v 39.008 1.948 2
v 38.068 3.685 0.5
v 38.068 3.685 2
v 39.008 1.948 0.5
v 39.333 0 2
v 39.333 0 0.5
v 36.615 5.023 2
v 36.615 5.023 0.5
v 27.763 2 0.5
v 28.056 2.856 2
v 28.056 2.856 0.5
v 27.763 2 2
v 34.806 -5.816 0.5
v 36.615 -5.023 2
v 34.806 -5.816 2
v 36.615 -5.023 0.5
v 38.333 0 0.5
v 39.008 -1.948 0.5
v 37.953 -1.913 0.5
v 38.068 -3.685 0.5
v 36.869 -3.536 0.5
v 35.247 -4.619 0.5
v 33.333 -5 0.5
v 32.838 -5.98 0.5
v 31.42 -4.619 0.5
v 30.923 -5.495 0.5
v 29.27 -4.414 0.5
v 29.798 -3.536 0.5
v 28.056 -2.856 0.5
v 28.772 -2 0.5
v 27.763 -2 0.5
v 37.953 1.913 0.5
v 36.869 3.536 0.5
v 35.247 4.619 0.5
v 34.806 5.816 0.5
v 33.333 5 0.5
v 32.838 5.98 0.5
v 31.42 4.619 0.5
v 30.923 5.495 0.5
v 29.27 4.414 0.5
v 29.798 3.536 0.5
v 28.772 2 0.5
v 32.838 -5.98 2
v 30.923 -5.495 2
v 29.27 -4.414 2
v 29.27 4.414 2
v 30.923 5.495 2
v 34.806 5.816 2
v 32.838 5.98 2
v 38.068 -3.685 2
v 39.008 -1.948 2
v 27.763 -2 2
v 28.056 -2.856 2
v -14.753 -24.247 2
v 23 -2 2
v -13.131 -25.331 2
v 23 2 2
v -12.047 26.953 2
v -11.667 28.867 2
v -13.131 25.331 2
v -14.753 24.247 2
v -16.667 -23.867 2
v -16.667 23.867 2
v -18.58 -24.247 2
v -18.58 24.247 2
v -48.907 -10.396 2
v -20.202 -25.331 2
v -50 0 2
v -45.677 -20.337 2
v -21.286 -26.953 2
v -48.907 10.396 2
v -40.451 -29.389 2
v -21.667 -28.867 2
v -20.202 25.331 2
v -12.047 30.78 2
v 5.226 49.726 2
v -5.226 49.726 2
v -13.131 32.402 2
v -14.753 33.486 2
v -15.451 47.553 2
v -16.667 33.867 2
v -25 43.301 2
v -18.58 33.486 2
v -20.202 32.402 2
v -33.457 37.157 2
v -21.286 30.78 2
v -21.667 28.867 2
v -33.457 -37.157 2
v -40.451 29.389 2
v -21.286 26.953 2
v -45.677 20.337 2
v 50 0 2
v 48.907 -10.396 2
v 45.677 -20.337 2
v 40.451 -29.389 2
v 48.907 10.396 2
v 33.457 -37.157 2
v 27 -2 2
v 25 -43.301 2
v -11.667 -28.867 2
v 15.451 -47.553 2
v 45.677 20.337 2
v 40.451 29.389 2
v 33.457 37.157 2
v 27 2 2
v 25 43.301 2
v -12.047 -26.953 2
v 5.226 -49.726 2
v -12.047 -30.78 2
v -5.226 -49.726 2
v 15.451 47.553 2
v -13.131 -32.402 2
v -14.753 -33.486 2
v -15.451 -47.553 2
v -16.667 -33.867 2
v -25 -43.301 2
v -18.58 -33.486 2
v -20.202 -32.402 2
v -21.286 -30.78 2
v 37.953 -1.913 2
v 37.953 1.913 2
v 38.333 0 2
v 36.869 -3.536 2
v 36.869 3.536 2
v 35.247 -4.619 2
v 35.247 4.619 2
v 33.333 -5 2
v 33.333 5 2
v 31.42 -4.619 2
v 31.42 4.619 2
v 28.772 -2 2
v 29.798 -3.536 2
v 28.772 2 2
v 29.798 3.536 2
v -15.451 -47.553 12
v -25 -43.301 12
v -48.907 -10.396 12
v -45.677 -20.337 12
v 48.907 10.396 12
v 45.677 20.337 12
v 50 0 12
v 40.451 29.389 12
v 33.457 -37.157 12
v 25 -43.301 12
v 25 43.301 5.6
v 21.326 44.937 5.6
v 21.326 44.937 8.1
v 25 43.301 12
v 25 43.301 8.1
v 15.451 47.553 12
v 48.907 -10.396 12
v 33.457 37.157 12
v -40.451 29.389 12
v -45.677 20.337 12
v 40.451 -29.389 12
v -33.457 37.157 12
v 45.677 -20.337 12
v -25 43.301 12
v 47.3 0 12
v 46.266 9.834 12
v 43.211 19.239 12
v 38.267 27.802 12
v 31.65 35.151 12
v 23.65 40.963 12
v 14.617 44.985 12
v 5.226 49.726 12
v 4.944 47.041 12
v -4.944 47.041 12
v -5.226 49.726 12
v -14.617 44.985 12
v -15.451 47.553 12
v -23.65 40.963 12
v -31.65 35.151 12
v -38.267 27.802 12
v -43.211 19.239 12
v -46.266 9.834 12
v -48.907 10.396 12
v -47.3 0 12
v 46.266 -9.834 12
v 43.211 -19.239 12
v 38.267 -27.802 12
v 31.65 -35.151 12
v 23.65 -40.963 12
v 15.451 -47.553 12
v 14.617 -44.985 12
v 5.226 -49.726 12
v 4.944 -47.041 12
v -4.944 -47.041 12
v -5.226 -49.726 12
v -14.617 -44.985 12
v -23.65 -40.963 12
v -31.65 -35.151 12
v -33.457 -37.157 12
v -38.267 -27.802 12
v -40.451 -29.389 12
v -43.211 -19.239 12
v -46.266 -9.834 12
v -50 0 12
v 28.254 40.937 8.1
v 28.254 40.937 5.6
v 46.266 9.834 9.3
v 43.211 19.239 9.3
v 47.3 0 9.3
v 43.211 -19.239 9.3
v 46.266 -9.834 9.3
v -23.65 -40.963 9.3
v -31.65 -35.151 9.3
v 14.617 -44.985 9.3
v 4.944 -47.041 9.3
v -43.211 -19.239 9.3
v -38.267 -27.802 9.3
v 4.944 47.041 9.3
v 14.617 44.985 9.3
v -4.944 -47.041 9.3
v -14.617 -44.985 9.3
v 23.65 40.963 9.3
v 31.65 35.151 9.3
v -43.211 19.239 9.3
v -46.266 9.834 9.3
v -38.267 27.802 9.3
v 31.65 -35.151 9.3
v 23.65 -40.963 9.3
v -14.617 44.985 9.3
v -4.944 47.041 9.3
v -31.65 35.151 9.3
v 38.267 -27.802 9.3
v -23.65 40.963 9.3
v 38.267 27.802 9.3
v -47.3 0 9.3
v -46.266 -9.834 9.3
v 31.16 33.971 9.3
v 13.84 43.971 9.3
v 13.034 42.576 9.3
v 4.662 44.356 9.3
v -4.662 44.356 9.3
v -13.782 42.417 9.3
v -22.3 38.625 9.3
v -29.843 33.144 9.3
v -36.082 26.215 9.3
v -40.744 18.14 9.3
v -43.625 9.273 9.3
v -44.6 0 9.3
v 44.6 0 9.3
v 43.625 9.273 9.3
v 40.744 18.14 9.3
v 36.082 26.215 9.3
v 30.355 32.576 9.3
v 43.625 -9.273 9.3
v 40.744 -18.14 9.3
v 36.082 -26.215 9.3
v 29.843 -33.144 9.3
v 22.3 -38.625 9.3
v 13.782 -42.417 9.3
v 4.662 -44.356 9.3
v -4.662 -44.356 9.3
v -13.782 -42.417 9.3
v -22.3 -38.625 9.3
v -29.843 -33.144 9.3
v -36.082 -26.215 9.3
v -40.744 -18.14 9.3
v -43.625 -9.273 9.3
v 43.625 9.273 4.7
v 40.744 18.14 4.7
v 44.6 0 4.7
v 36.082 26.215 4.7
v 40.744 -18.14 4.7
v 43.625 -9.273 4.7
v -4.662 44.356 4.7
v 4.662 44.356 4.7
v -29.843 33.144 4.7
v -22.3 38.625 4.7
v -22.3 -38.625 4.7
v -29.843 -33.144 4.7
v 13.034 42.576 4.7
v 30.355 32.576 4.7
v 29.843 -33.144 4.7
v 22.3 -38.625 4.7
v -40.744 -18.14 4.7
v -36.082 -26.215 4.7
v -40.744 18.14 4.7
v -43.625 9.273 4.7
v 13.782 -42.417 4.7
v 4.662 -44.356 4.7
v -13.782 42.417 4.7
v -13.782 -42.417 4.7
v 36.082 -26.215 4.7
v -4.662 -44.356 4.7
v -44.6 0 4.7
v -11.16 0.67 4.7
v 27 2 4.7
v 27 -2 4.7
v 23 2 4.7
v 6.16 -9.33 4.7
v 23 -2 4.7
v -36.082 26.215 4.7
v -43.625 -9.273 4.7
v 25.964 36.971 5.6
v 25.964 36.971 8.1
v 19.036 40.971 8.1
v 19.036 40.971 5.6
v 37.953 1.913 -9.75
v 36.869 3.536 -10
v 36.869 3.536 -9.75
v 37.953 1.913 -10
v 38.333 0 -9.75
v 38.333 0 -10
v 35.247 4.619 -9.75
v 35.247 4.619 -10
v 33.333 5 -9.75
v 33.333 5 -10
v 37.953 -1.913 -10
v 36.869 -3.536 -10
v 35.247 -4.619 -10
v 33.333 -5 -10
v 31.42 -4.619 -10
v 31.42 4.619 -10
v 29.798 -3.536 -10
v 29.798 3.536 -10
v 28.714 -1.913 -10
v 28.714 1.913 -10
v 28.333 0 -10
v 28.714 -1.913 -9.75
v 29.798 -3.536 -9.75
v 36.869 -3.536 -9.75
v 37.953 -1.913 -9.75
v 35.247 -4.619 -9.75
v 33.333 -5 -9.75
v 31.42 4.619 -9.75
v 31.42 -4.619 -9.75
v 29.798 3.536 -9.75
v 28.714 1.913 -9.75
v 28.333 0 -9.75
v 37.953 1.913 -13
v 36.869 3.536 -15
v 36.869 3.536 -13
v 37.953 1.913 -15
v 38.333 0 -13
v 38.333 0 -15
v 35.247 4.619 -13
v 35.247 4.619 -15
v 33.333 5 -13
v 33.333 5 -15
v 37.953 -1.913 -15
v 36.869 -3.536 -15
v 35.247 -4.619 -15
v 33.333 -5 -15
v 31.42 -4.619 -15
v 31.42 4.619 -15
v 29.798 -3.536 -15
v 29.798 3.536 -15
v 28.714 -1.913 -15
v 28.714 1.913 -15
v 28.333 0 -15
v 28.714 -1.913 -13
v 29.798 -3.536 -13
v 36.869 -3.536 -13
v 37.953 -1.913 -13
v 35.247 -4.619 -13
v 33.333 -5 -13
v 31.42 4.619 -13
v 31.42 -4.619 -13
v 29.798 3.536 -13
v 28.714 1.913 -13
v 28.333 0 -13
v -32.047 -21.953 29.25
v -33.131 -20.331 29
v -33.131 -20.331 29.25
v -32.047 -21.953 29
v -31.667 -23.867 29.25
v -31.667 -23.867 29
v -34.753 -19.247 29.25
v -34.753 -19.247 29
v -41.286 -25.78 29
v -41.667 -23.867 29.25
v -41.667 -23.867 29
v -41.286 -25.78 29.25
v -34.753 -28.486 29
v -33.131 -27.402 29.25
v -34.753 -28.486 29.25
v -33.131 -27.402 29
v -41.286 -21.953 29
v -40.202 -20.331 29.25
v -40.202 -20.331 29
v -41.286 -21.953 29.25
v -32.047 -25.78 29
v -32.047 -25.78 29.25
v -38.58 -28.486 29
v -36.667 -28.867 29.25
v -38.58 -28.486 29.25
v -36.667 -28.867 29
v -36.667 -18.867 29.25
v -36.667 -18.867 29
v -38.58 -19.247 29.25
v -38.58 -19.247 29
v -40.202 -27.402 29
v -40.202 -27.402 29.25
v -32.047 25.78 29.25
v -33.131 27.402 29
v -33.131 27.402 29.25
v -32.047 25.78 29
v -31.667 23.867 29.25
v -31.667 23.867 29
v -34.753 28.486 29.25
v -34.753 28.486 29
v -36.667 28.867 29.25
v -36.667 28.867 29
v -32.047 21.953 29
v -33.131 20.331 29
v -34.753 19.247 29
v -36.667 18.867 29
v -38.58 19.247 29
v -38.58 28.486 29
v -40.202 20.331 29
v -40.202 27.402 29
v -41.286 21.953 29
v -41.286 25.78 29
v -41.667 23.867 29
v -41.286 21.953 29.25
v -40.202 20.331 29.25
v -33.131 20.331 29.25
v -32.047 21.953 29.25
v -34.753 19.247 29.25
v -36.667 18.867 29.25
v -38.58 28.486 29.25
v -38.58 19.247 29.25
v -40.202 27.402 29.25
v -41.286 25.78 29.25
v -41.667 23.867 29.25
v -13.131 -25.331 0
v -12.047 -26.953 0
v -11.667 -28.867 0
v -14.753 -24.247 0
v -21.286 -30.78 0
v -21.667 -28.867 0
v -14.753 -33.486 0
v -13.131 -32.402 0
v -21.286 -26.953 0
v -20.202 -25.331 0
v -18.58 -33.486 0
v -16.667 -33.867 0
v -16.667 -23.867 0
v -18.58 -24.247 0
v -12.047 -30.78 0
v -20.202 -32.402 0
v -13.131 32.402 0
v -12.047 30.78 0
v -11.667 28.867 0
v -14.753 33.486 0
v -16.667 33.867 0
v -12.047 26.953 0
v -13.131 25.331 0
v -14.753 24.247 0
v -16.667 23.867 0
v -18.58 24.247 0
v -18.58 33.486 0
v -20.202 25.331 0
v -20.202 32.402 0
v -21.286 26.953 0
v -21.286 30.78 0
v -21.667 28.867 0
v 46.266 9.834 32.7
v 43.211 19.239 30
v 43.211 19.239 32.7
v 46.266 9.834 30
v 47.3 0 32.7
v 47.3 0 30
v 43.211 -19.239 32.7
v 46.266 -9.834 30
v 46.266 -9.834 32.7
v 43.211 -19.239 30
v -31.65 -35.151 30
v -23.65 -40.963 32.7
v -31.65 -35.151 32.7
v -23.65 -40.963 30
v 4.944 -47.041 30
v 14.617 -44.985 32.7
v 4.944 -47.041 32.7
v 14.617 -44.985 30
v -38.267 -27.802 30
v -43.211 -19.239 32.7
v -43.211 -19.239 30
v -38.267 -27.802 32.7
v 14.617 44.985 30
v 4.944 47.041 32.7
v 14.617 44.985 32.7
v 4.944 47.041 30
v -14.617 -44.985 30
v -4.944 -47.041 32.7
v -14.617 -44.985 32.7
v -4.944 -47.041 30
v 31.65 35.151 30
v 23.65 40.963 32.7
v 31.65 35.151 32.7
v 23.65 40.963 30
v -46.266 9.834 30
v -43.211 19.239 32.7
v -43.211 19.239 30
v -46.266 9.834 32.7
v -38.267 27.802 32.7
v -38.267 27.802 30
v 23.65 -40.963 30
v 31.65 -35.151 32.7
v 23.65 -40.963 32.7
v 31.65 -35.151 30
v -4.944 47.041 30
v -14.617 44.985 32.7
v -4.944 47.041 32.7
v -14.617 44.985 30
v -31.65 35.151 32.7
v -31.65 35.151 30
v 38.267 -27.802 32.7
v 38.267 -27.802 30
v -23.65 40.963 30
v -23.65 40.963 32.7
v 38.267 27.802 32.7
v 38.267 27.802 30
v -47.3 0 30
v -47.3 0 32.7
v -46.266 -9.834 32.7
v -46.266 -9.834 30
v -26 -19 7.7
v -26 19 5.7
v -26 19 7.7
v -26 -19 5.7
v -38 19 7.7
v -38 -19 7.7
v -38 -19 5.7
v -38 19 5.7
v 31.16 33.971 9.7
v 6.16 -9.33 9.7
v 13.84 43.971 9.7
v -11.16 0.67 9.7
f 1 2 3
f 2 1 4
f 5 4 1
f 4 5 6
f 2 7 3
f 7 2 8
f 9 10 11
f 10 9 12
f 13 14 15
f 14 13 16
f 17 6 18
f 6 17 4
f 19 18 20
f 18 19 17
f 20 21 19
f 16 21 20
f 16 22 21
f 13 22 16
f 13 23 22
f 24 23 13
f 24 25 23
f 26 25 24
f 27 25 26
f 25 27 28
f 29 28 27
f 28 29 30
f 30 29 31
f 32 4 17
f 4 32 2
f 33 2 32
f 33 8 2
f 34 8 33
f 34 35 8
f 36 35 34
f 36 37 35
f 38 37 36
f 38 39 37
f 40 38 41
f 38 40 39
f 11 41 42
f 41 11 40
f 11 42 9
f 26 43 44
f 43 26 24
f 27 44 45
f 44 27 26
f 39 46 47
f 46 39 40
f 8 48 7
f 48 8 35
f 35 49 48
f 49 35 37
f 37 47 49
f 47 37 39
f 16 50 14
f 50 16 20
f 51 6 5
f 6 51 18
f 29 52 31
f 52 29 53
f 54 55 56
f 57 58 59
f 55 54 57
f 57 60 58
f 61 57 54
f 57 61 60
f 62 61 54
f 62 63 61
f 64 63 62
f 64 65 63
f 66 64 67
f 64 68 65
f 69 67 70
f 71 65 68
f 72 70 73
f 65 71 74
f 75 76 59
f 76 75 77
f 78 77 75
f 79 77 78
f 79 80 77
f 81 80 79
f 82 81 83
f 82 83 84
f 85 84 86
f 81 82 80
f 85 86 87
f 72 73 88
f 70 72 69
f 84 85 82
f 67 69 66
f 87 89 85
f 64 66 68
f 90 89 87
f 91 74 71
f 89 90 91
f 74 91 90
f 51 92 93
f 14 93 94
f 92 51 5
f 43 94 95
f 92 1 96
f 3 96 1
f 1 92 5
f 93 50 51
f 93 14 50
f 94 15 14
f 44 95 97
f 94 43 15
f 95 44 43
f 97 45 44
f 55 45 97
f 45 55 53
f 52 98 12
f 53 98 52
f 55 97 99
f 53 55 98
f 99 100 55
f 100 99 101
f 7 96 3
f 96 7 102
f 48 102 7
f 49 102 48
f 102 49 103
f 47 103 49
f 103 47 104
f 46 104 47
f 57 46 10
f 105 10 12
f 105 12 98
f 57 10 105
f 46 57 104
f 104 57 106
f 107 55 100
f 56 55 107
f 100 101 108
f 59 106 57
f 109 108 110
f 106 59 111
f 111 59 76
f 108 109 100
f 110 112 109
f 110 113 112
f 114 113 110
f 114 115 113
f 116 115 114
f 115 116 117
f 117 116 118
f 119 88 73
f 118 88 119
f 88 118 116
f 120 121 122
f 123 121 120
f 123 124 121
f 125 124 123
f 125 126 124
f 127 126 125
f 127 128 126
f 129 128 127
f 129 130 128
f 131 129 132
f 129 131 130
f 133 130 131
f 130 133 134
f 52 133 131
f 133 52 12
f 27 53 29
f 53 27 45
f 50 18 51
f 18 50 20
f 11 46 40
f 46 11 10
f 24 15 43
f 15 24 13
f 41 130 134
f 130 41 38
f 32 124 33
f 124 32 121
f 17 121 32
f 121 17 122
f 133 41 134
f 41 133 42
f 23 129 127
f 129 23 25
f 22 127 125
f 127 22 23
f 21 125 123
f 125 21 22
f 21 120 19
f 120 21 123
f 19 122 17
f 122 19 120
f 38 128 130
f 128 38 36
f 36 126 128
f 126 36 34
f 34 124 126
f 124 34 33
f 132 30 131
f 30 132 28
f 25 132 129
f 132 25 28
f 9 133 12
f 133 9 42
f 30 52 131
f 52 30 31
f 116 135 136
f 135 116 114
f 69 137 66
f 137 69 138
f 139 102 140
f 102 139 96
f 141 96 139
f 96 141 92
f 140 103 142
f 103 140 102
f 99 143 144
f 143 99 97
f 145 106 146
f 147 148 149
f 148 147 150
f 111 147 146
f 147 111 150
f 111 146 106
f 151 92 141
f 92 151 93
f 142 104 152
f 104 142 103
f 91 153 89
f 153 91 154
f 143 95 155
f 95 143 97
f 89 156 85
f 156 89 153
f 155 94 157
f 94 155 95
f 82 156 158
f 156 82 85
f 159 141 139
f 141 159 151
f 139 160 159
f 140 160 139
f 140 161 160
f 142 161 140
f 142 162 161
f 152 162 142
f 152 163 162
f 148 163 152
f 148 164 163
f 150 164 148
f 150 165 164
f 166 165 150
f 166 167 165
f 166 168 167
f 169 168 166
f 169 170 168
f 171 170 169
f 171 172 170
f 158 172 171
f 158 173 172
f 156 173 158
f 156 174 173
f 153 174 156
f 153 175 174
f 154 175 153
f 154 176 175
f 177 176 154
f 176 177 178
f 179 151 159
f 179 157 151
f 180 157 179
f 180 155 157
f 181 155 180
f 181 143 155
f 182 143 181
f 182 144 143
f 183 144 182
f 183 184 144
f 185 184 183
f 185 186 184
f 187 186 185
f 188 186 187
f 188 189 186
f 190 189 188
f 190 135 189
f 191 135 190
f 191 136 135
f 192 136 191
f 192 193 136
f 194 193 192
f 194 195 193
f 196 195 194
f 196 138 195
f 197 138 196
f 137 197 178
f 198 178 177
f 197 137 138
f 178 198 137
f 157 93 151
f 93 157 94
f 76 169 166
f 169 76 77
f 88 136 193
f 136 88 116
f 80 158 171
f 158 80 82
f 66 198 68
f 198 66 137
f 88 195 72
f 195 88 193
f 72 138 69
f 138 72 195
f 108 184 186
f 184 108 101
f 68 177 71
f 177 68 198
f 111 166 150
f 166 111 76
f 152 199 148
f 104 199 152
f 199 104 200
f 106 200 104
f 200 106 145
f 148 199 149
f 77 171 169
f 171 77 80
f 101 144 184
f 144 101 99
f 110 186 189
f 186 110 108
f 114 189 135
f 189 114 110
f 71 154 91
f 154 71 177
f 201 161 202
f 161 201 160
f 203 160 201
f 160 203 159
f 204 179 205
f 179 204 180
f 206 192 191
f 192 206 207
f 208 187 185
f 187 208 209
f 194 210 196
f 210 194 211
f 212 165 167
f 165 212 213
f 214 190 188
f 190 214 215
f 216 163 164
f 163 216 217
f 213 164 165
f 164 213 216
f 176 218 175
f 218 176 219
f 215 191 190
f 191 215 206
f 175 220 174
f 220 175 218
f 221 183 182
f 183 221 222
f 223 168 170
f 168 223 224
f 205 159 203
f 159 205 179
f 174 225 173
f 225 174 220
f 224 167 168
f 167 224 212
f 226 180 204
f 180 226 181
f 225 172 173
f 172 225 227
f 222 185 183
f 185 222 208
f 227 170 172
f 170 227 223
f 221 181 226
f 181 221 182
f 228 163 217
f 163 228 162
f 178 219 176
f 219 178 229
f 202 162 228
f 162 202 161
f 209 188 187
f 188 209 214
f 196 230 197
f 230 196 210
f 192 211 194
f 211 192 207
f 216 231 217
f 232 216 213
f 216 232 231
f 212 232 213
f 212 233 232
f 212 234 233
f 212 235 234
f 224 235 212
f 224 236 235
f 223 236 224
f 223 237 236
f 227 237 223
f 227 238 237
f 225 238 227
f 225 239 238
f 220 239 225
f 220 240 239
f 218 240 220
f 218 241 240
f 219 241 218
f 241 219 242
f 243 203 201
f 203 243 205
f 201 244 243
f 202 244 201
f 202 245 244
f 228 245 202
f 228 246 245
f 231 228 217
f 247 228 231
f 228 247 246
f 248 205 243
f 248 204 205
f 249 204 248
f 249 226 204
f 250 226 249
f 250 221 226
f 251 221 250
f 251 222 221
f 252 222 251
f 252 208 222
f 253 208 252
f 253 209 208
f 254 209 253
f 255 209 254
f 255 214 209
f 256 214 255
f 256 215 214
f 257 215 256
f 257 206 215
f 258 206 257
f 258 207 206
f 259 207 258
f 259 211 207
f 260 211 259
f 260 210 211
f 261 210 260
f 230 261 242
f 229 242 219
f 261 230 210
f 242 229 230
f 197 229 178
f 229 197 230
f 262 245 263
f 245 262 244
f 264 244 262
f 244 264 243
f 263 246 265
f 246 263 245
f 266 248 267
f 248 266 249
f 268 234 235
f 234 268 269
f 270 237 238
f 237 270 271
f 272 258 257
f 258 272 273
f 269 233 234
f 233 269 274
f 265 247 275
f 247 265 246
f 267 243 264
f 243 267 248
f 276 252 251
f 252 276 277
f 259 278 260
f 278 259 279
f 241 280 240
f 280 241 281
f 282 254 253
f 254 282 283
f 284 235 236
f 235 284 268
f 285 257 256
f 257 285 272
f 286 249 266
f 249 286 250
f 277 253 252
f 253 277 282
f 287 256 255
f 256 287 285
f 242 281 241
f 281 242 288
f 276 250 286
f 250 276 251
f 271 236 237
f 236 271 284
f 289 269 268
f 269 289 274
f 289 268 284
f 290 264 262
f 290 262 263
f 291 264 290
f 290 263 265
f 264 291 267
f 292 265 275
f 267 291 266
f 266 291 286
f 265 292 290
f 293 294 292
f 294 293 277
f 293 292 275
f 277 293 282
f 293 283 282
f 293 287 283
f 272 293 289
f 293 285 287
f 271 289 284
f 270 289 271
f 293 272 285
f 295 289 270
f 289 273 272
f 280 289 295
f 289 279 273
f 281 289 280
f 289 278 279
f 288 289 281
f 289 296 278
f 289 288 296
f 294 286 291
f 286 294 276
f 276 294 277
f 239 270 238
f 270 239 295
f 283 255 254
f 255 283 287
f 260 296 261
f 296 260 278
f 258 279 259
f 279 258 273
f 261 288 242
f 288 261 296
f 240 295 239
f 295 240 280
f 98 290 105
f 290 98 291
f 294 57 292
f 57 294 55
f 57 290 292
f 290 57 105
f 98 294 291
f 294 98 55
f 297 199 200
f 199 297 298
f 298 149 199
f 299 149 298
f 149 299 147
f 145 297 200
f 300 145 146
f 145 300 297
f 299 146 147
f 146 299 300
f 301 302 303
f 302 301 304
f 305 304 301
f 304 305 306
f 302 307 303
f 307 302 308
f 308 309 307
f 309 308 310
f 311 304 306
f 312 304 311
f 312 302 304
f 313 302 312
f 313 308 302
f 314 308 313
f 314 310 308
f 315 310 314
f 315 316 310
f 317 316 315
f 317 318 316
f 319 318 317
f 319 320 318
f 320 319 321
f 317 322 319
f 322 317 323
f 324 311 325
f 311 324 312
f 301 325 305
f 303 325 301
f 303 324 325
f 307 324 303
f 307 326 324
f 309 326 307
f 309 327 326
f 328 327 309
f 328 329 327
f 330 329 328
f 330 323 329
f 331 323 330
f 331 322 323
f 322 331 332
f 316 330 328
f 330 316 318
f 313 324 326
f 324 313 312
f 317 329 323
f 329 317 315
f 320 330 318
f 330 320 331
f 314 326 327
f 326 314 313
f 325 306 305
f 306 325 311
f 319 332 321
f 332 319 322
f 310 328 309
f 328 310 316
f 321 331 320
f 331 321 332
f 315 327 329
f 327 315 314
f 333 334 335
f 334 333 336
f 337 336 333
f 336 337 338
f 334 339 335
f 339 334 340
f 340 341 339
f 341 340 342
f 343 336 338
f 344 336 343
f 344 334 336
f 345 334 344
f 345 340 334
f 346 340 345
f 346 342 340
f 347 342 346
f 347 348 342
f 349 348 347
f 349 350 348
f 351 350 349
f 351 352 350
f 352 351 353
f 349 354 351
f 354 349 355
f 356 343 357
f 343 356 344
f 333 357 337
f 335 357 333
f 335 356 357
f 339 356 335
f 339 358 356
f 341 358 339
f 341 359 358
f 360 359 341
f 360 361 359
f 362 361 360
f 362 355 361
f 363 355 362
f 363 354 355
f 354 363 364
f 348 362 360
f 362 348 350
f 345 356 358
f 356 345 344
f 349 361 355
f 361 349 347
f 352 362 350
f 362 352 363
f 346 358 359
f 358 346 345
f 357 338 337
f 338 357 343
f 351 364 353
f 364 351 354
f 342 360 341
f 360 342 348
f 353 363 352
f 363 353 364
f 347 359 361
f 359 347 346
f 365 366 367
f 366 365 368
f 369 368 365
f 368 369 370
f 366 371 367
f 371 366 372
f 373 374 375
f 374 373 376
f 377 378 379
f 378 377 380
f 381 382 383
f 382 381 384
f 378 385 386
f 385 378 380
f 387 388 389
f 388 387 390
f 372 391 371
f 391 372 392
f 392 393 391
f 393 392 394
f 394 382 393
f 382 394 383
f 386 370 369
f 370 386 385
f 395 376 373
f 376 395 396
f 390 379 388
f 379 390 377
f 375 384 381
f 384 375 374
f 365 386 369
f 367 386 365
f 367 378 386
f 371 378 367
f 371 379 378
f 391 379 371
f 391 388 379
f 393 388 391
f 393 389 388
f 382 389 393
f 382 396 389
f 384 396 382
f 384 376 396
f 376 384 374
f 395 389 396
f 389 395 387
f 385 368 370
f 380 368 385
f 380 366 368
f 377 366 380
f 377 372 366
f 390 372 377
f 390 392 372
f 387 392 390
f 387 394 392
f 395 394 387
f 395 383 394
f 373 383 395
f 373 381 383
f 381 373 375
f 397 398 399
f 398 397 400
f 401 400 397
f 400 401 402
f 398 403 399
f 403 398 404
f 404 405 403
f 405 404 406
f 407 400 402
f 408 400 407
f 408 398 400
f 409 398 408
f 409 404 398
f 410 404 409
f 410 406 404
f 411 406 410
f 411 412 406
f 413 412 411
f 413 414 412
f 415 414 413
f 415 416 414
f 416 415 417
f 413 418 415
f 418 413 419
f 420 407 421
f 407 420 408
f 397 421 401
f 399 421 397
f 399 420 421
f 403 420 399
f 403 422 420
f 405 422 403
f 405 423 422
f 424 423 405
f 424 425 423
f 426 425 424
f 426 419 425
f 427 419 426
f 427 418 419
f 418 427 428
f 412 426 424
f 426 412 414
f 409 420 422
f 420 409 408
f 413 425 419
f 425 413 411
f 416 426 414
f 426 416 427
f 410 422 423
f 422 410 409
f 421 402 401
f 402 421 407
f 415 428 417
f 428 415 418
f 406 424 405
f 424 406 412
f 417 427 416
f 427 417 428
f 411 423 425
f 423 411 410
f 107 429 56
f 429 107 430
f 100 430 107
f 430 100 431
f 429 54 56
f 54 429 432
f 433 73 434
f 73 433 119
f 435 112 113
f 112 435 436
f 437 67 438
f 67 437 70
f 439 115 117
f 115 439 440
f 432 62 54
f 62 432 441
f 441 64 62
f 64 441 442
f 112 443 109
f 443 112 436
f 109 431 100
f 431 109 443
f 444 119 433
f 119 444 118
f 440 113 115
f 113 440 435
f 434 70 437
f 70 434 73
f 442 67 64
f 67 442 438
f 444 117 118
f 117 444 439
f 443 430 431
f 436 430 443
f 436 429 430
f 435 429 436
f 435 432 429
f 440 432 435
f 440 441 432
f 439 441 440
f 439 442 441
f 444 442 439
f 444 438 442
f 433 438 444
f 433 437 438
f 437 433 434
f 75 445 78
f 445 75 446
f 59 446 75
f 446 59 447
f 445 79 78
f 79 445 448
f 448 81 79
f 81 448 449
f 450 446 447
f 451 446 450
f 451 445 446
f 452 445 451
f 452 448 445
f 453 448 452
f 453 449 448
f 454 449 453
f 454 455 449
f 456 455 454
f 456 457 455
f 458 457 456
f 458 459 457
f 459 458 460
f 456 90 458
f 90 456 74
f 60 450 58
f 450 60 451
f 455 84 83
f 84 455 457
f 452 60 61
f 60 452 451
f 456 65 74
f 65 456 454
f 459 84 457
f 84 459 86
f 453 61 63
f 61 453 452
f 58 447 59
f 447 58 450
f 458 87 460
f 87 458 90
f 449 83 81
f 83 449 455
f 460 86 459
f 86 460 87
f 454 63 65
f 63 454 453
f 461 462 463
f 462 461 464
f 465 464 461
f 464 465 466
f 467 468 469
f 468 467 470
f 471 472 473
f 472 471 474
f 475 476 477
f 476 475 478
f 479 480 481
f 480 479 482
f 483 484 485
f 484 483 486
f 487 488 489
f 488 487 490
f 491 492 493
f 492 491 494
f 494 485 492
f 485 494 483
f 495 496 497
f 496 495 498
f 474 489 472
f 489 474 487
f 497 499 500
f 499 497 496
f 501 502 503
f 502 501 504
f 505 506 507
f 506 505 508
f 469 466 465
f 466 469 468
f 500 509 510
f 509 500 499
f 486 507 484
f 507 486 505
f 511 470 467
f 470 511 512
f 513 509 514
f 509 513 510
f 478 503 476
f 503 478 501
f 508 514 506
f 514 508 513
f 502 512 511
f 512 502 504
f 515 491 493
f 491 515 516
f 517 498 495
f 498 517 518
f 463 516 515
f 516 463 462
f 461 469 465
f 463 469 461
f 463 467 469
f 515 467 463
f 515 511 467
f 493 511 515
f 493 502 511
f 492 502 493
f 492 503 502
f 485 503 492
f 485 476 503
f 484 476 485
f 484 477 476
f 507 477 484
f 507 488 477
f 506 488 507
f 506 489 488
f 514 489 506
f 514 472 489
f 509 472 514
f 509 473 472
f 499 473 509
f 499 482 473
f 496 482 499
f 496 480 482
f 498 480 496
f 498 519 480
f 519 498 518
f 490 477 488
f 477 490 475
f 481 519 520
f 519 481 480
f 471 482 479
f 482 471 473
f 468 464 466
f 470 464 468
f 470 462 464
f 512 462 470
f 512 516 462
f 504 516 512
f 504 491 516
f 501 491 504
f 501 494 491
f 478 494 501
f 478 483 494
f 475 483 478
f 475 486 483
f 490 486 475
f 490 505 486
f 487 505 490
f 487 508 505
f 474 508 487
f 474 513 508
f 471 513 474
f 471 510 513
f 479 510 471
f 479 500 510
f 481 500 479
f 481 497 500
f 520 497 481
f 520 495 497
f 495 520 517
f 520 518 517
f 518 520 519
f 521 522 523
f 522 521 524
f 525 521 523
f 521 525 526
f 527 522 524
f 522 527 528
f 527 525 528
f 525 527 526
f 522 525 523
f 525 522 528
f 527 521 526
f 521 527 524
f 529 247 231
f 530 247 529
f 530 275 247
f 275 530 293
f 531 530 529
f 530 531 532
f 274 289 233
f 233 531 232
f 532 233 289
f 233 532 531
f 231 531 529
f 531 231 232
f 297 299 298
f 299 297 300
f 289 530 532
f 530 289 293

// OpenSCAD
R1=50;
R2=R1*(2/3);
E1=2.7;
H1=10;

color("Orange",0.8) translate([R2,0,-10]) cylinder(0.25,5,5);
color("black",0.5) translate([R2,0,-15]) cylinder(2,5,5);

color("DeepPink") translate([-0.5*R2-20,-0.866*R2+5,29]) cylinder(0.25,5,5);
color("DeepPink") translate([-0.5*R2-20,0.866*R2-5,29]) cylinder(0.25,5,5);

color("DodgerBlue") 
translate([R2,0,0.5])

difference(){
    difference(){
        cylinder(1.5,6,6);
        translate([0,0,-1]) cylinder(10,5,5);
    }
    translate([-2,0,0]) cube([10,4,4],true);
}

color("DodgerBlue") translate([-0.5*R2,-0.866*R2,0]) cylinder(2,5,5);
color("DodgerBlue") translate([-0.5*R2,0.866*R2,0]) cylinder(2,5,5);

color("DodgerBlue")
translate([0,0,2]) 
difference(){
    difference(){
        difference(){
            difference(){
                cylinder(H1,R1,R1);
                translate([0,0,H1-E1])cylinder(H1,R1-E1,R1-E1);
            }
            translate([0,0,E1]) cylinder(H1,R1-2*E1,R1-2*E1);
        }
        translate([R1/2,0,0]) cube([4,4,10],true);
    }
    rotate([0,0,-30])  translate([0,50,H1/2-0.15]) cube([8,50,2.5],true);
}

color("Black",0.5) translate([0,0,H1+20])cylinder(E1,R1-E1,R1-E1);

color("DarkBlue",0.8) translate([-32,0,2+E1+2]) cube([12,38,2],true);

rotate([0,0,-30]) color("ForestGreen",0.5) translate([0,20,2+E1+2]) cube([20,50,6],true);
